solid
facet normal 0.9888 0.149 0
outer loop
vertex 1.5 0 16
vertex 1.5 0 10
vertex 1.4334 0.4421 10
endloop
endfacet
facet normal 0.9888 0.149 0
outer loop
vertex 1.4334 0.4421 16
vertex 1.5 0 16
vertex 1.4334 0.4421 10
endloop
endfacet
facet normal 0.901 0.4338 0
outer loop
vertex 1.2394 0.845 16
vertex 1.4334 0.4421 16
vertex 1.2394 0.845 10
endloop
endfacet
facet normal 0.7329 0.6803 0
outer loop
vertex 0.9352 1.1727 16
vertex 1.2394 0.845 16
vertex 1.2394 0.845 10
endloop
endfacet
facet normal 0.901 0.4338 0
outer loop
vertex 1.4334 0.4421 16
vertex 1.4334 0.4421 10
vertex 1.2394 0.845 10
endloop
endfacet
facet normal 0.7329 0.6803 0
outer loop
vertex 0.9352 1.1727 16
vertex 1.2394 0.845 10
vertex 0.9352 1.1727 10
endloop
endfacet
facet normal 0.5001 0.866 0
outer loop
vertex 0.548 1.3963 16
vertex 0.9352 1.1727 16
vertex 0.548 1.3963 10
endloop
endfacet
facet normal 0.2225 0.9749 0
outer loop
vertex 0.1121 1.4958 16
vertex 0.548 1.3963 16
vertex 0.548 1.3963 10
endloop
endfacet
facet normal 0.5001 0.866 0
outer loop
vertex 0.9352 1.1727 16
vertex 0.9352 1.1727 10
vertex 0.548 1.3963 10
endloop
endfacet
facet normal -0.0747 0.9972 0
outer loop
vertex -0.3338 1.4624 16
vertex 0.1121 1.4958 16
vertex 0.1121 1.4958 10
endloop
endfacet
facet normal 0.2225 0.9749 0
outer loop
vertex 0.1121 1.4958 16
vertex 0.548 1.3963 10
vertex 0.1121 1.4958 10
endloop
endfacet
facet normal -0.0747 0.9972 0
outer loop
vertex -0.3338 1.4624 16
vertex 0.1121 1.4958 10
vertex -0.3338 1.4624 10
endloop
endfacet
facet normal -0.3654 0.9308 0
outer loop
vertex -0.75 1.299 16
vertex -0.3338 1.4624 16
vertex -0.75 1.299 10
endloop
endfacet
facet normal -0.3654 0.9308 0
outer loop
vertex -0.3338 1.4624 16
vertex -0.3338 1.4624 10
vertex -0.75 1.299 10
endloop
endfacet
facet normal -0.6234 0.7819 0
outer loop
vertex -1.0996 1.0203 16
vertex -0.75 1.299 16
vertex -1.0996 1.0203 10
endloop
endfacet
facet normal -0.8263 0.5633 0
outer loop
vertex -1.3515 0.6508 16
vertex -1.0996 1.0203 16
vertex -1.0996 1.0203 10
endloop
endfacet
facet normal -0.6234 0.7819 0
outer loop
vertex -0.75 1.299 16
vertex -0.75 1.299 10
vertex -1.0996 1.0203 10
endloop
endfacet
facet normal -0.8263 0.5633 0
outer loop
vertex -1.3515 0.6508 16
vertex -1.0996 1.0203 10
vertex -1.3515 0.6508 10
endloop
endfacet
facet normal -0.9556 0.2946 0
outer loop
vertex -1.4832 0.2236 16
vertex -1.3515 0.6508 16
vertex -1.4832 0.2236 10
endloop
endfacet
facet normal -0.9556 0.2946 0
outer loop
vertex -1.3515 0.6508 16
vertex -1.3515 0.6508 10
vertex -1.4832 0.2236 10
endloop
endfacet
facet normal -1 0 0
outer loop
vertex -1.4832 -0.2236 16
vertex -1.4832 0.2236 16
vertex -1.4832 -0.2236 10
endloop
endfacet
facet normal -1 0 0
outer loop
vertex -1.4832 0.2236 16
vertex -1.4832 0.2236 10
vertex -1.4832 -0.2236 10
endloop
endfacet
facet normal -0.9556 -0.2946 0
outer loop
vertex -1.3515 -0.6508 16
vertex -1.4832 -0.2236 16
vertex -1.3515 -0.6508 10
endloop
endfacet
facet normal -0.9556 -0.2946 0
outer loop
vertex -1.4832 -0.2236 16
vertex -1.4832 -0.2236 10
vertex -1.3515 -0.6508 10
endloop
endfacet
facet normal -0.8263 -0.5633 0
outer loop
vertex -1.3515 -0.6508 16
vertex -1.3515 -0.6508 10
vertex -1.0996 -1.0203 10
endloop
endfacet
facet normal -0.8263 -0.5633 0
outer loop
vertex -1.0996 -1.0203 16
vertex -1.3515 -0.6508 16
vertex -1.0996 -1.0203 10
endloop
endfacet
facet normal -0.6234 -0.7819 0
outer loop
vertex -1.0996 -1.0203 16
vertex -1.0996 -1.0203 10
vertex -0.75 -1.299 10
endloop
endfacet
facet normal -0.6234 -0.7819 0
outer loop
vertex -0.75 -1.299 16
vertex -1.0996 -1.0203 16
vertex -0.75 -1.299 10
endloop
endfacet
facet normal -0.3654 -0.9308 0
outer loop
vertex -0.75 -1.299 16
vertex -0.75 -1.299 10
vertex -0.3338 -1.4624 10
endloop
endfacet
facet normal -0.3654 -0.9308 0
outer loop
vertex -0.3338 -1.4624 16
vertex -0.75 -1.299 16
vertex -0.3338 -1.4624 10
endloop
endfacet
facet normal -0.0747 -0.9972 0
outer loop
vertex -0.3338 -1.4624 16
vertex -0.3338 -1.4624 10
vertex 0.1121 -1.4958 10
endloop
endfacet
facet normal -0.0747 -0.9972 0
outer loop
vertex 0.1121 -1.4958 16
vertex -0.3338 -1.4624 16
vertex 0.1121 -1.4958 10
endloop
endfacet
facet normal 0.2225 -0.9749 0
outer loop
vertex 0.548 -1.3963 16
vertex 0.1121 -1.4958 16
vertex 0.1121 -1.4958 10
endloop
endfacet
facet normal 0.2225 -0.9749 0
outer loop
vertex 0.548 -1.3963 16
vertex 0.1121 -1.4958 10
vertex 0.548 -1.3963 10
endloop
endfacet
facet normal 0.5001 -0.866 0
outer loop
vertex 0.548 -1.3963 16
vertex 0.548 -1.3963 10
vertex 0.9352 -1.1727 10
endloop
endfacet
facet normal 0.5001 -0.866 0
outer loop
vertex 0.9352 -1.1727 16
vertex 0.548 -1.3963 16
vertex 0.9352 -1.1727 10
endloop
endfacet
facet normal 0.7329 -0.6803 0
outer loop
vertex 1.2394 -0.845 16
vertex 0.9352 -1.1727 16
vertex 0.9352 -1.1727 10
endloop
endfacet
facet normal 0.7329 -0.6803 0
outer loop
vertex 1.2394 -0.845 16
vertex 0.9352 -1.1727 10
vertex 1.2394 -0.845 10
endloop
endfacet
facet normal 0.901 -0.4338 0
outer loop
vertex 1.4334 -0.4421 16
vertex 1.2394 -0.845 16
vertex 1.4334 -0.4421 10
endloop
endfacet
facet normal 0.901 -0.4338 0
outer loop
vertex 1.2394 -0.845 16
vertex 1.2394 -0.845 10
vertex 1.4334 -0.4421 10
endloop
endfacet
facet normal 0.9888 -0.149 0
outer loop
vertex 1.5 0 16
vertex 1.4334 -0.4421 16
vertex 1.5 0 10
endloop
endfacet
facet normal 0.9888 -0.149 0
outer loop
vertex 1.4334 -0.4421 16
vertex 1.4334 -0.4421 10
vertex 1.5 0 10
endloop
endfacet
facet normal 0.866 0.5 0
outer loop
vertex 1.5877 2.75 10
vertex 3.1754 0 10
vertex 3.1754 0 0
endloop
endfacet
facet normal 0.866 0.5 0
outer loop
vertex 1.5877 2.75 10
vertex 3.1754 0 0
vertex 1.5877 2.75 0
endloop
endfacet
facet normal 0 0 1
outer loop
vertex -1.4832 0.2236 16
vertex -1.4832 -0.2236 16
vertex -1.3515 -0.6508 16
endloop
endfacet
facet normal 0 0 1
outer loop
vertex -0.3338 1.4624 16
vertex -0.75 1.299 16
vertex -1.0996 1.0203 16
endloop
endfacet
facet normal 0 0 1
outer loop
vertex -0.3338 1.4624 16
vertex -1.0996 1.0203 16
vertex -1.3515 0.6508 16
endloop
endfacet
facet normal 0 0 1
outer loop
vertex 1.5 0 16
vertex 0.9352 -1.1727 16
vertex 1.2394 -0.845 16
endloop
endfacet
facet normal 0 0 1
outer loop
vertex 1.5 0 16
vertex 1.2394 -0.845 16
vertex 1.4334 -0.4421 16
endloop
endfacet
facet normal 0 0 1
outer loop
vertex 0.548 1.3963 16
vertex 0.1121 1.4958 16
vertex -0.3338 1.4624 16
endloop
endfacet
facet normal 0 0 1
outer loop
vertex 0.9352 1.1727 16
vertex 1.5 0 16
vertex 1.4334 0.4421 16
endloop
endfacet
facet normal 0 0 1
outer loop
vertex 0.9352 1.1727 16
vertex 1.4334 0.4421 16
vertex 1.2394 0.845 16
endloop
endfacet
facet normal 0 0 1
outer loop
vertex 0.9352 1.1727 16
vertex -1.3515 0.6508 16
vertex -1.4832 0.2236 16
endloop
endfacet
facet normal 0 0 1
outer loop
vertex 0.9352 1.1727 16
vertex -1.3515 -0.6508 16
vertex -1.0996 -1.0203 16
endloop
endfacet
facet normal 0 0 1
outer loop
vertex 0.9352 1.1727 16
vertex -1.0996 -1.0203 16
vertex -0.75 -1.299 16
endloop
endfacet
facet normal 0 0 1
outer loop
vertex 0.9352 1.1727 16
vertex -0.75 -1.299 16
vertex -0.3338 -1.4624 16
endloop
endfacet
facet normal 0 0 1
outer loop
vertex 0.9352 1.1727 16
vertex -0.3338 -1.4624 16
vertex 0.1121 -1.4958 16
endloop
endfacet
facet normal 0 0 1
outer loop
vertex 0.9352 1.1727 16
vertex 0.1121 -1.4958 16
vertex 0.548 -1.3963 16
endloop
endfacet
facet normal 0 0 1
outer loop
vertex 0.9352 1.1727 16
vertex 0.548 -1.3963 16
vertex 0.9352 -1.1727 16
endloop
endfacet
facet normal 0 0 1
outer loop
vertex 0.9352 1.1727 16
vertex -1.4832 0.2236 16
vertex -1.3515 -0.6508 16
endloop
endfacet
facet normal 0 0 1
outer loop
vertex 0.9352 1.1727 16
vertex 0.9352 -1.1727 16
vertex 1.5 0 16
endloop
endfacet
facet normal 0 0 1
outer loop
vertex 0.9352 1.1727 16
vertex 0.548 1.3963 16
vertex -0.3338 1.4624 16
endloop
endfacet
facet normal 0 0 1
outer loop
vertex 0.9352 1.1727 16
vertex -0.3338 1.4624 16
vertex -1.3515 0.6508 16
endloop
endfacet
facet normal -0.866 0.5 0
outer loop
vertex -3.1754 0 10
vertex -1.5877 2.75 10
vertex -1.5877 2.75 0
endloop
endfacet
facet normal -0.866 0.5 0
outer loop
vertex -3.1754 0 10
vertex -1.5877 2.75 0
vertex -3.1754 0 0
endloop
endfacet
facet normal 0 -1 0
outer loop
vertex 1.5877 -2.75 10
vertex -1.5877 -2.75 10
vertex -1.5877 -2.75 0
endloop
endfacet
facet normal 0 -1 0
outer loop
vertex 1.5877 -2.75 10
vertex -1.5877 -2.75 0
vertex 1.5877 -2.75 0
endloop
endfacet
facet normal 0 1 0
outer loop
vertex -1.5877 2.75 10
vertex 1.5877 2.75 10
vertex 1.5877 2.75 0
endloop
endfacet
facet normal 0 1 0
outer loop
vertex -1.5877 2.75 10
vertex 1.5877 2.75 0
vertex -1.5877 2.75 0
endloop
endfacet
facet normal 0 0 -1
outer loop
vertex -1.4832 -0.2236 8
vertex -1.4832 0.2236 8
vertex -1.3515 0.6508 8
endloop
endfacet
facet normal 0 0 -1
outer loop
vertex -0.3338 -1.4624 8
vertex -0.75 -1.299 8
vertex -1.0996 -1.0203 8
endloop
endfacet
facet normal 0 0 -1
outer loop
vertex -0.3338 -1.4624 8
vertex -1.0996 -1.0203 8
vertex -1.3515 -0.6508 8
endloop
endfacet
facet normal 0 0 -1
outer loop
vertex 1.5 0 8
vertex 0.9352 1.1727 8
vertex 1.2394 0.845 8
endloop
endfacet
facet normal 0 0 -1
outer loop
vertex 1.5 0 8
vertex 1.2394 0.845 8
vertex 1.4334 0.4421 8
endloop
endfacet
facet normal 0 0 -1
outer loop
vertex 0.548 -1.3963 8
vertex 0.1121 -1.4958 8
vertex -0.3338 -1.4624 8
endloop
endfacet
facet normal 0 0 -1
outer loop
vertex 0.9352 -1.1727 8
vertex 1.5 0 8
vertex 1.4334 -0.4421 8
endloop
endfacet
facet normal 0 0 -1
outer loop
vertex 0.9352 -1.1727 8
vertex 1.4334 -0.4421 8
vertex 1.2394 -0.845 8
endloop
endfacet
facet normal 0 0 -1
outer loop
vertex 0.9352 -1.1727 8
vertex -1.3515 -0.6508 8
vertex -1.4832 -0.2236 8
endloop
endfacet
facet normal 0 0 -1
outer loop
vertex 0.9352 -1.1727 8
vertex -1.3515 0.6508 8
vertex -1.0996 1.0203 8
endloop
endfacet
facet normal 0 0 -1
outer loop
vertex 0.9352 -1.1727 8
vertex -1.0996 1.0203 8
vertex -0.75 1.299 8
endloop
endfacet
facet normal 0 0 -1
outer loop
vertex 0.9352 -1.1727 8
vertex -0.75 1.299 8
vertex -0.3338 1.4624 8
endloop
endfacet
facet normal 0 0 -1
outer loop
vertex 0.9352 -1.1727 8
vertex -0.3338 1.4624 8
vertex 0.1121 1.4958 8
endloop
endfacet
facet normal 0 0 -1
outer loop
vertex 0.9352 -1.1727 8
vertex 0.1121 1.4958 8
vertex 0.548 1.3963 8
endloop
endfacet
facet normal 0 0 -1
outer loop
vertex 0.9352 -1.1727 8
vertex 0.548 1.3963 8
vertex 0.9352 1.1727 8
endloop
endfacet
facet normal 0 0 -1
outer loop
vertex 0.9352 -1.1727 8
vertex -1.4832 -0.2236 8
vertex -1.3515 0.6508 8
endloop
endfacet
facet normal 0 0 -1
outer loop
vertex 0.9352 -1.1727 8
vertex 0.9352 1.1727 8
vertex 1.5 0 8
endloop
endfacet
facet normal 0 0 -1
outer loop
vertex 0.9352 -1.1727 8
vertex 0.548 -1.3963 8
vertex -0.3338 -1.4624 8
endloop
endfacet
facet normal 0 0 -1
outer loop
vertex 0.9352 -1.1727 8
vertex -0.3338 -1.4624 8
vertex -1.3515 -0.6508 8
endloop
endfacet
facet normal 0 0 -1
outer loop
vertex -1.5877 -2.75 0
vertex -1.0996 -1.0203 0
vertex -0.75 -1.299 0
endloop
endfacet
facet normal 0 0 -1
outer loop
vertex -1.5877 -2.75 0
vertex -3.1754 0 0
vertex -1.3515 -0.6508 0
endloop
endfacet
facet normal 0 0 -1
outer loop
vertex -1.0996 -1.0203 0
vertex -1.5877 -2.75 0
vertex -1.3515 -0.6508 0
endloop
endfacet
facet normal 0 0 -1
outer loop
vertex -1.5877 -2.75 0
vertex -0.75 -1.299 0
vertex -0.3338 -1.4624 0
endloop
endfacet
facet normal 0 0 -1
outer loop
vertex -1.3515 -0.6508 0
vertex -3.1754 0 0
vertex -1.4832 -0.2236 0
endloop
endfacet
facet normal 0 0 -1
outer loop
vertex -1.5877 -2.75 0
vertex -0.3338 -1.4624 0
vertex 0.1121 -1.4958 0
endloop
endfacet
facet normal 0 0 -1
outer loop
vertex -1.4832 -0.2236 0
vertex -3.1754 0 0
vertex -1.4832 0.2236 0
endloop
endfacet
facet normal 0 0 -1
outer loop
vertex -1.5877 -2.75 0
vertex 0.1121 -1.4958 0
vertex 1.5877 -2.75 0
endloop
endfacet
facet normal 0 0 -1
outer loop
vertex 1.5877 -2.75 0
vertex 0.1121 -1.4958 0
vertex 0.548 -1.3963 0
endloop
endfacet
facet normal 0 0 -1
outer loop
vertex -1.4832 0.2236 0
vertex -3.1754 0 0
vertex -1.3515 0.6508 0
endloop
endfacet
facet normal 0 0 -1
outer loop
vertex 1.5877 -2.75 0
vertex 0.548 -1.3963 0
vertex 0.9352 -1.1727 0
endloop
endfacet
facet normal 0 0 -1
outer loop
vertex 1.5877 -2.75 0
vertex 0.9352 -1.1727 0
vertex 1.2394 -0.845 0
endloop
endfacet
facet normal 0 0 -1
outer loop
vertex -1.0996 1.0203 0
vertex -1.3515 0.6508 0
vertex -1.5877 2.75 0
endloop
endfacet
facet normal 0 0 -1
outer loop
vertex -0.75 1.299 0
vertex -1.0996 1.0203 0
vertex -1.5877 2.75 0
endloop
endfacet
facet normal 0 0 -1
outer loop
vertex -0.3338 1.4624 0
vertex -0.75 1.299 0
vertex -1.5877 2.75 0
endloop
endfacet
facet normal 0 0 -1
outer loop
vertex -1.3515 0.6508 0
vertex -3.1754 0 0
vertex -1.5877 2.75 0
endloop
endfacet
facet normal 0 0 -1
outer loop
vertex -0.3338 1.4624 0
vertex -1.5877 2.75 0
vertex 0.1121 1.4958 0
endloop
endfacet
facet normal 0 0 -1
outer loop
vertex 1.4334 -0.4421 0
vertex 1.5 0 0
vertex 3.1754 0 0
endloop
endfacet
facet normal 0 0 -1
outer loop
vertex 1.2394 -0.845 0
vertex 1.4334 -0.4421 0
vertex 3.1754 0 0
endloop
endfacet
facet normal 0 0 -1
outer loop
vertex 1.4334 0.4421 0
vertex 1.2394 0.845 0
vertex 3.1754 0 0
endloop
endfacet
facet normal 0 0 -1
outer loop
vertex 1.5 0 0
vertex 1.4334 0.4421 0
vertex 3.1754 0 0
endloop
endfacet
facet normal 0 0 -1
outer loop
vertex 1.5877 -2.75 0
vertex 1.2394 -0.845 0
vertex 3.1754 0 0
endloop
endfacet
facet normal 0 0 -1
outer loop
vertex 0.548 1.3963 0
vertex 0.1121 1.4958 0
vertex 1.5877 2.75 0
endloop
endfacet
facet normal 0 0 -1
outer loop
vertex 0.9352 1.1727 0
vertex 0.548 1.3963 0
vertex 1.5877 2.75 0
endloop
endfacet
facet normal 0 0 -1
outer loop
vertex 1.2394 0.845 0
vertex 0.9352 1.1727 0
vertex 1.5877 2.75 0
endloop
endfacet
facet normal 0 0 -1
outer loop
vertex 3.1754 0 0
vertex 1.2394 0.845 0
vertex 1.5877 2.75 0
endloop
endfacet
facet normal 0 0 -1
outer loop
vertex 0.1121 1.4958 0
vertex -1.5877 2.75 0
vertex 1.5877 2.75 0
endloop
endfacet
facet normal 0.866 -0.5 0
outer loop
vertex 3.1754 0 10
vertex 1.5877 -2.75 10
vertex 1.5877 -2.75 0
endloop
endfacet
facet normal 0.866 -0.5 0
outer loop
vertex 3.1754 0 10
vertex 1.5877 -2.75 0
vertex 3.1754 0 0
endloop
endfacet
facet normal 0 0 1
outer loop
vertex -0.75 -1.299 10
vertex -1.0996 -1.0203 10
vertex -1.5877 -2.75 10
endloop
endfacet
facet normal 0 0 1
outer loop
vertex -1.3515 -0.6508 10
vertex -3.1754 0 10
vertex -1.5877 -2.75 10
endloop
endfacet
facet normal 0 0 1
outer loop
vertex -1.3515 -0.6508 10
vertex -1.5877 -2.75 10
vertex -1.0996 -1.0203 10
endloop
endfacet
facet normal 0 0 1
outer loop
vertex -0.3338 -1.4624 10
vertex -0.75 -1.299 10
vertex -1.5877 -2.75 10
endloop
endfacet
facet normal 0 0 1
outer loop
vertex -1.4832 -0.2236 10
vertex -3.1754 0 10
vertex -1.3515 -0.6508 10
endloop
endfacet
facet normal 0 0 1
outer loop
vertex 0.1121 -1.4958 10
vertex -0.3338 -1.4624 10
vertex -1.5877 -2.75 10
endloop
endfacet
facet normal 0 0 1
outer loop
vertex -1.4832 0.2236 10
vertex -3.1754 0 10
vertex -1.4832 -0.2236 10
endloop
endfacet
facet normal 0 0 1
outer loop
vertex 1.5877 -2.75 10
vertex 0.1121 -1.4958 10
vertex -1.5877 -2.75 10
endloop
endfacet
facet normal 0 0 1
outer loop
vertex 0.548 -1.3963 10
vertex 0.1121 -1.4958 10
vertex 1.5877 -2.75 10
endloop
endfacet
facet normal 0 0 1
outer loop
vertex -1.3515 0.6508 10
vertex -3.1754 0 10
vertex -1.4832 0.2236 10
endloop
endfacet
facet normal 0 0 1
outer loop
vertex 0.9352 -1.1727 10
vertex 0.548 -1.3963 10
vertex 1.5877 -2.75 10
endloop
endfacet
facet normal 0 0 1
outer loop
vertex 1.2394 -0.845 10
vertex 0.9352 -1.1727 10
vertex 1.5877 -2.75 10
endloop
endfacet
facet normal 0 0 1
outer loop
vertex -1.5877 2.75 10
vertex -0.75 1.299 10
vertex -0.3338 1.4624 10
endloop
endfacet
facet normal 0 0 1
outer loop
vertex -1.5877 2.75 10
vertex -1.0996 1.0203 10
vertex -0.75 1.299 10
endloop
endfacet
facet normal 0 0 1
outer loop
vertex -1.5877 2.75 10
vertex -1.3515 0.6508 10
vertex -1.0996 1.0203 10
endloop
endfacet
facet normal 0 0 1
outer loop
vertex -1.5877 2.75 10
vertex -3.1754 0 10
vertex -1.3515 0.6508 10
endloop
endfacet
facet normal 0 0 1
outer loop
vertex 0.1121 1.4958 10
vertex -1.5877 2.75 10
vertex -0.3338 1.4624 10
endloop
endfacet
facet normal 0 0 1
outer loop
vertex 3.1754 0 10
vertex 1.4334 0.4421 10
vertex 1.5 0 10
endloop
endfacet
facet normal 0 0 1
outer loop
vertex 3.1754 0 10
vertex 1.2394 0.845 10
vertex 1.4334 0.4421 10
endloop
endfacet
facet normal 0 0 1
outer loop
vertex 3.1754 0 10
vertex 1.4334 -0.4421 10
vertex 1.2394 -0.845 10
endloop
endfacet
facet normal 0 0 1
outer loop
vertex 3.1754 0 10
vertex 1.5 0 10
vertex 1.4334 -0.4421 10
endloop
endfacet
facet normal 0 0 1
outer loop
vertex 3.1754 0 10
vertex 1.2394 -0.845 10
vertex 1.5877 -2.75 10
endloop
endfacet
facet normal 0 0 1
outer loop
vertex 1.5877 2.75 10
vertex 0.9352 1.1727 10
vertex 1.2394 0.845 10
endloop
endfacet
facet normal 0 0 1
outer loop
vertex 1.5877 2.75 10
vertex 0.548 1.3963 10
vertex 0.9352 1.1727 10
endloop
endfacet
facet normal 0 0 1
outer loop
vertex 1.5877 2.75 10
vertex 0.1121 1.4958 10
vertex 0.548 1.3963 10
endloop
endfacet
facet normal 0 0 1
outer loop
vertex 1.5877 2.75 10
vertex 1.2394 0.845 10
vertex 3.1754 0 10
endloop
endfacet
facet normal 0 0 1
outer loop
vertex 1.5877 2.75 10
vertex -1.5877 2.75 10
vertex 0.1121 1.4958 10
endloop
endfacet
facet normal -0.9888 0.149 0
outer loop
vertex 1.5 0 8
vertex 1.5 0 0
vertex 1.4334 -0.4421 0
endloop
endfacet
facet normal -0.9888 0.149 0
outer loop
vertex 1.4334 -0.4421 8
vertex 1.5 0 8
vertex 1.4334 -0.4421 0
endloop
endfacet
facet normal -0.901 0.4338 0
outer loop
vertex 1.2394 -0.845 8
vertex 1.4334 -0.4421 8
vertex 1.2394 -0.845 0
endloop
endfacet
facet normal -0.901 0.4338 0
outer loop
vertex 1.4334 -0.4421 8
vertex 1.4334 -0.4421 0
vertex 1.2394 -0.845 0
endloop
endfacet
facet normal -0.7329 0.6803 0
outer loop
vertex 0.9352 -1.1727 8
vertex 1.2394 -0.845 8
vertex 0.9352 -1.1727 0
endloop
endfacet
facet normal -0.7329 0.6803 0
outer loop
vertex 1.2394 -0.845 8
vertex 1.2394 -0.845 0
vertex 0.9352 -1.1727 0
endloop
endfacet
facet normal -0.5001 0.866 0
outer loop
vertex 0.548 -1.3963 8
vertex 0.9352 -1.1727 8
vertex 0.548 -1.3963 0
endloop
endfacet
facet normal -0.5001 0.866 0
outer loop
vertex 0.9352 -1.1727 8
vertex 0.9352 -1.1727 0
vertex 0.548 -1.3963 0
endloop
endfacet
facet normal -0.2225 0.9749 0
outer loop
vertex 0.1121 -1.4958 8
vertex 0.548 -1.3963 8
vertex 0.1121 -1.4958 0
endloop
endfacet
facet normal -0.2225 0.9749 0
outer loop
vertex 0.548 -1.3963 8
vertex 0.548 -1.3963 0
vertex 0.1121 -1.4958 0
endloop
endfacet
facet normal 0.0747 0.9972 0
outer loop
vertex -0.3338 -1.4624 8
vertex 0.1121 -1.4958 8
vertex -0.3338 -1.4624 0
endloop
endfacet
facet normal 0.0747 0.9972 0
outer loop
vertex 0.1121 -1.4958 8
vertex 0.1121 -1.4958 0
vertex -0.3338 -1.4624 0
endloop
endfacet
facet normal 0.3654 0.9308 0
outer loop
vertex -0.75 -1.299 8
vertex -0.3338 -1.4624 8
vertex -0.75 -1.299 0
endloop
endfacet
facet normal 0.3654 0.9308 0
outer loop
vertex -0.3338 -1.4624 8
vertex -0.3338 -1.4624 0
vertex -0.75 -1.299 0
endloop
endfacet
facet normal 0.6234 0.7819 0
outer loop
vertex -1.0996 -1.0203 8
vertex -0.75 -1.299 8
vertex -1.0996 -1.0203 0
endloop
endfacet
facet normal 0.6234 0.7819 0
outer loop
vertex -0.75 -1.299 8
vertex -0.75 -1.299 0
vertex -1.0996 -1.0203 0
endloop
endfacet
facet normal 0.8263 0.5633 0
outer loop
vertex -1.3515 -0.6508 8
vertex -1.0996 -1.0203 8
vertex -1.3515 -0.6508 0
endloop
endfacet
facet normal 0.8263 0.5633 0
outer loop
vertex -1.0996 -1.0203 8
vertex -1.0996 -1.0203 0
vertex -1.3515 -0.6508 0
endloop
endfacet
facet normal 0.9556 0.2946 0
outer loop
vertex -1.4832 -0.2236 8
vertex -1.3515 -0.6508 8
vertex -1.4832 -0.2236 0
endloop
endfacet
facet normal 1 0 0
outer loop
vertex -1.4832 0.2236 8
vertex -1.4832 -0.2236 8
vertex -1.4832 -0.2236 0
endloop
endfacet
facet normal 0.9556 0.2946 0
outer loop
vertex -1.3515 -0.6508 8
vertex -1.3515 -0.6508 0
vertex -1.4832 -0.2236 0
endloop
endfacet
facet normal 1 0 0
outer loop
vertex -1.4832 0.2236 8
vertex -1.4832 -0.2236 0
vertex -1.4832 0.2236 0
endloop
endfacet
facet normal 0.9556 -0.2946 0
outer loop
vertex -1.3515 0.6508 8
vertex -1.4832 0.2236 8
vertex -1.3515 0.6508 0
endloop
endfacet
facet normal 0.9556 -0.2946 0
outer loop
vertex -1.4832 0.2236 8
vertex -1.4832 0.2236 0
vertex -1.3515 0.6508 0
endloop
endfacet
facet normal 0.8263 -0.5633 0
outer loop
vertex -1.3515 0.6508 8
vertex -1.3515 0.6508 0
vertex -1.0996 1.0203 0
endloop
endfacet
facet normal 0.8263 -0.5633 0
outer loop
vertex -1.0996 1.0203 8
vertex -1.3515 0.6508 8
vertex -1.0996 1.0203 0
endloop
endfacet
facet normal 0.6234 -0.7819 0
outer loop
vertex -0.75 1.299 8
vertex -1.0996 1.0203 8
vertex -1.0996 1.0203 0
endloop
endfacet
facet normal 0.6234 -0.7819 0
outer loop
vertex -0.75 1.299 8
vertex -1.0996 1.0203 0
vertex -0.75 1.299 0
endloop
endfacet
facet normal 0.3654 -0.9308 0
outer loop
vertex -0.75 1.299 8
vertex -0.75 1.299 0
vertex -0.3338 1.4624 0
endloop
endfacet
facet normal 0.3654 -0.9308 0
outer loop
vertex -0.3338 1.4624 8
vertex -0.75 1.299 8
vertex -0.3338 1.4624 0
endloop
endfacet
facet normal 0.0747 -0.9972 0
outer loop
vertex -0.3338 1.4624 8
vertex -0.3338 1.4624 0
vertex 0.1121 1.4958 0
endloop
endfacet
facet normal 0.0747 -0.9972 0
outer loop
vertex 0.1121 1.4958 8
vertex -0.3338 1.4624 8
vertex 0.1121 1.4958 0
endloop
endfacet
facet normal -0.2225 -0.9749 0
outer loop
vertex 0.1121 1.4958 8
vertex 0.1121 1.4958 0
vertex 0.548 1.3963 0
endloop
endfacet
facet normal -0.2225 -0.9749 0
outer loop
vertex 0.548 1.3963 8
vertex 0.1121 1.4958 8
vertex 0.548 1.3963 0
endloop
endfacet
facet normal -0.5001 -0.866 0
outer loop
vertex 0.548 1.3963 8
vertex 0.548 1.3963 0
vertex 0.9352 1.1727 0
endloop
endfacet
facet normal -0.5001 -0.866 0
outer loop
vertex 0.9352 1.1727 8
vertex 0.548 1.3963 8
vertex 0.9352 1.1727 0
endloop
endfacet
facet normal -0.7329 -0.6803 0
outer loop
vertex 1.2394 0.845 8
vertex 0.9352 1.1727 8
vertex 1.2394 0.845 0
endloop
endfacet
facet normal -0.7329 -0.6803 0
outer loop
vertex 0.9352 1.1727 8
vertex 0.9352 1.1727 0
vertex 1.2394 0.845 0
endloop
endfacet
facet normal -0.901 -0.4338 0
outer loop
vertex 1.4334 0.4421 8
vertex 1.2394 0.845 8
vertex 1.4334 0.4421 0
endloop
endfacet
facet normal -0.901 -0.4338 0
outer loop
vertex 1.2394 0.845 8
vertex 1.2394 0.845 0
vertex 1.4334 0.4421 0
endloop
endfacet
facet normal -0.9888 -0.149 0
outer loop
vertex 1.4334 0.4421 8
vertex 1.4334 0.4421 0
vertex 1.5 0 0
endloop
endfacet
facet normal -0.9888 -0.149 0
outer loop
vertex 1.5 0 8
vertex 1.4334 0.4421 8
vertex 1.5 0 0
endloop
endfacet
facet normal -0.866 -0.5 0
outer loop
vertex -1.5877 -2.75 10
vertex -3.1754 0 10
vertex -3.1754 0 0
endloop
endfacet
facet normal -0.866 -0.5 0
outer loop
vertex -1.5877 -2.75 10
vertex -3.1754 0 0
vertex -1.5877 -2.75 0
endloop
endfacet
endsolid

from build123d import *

# Parameters (mm, degrees)
PAD_DEPTH    = 10
SKETCH001_R  = 1.5
PAD001_DEPTH = 6
SKETCH002_R  = 1.5
POCKET_DEPTH = 8


with BuildPart() as part:
    # Sketch → Pad (new body)
    with BuildSketch(Plane.XY):
        Polygon((1.587713, -2.75), (3.175426, 0), (1.587713, 2.75), (-1.587713, 2.75), (-3.175426, 0), (-1.587713, -2.75), align=None)
    extrude(amount=PAD_DEPTH)

    # Sketch001 (on Face8 of Pad) → Pad001 (join)
    with BuildSketch(Plane.XY.offset(10)):
        Circle(SKETCH001_R)
    extrude(amount=PAD001_DEPTH)

    # Sketch002 (on Face4 of Pad001) → Pocket (cut)
    with BuildSketch(Plane(origin=(0, 0, 0), x_dir=(1, 0, 0), z_dir=(0, 0, -1))):
        Circle(SKETCH002_R)
    extrude(amount=-POCKET_DEPTH, mode=Mode.SUBTRACT)


solid = part.part
